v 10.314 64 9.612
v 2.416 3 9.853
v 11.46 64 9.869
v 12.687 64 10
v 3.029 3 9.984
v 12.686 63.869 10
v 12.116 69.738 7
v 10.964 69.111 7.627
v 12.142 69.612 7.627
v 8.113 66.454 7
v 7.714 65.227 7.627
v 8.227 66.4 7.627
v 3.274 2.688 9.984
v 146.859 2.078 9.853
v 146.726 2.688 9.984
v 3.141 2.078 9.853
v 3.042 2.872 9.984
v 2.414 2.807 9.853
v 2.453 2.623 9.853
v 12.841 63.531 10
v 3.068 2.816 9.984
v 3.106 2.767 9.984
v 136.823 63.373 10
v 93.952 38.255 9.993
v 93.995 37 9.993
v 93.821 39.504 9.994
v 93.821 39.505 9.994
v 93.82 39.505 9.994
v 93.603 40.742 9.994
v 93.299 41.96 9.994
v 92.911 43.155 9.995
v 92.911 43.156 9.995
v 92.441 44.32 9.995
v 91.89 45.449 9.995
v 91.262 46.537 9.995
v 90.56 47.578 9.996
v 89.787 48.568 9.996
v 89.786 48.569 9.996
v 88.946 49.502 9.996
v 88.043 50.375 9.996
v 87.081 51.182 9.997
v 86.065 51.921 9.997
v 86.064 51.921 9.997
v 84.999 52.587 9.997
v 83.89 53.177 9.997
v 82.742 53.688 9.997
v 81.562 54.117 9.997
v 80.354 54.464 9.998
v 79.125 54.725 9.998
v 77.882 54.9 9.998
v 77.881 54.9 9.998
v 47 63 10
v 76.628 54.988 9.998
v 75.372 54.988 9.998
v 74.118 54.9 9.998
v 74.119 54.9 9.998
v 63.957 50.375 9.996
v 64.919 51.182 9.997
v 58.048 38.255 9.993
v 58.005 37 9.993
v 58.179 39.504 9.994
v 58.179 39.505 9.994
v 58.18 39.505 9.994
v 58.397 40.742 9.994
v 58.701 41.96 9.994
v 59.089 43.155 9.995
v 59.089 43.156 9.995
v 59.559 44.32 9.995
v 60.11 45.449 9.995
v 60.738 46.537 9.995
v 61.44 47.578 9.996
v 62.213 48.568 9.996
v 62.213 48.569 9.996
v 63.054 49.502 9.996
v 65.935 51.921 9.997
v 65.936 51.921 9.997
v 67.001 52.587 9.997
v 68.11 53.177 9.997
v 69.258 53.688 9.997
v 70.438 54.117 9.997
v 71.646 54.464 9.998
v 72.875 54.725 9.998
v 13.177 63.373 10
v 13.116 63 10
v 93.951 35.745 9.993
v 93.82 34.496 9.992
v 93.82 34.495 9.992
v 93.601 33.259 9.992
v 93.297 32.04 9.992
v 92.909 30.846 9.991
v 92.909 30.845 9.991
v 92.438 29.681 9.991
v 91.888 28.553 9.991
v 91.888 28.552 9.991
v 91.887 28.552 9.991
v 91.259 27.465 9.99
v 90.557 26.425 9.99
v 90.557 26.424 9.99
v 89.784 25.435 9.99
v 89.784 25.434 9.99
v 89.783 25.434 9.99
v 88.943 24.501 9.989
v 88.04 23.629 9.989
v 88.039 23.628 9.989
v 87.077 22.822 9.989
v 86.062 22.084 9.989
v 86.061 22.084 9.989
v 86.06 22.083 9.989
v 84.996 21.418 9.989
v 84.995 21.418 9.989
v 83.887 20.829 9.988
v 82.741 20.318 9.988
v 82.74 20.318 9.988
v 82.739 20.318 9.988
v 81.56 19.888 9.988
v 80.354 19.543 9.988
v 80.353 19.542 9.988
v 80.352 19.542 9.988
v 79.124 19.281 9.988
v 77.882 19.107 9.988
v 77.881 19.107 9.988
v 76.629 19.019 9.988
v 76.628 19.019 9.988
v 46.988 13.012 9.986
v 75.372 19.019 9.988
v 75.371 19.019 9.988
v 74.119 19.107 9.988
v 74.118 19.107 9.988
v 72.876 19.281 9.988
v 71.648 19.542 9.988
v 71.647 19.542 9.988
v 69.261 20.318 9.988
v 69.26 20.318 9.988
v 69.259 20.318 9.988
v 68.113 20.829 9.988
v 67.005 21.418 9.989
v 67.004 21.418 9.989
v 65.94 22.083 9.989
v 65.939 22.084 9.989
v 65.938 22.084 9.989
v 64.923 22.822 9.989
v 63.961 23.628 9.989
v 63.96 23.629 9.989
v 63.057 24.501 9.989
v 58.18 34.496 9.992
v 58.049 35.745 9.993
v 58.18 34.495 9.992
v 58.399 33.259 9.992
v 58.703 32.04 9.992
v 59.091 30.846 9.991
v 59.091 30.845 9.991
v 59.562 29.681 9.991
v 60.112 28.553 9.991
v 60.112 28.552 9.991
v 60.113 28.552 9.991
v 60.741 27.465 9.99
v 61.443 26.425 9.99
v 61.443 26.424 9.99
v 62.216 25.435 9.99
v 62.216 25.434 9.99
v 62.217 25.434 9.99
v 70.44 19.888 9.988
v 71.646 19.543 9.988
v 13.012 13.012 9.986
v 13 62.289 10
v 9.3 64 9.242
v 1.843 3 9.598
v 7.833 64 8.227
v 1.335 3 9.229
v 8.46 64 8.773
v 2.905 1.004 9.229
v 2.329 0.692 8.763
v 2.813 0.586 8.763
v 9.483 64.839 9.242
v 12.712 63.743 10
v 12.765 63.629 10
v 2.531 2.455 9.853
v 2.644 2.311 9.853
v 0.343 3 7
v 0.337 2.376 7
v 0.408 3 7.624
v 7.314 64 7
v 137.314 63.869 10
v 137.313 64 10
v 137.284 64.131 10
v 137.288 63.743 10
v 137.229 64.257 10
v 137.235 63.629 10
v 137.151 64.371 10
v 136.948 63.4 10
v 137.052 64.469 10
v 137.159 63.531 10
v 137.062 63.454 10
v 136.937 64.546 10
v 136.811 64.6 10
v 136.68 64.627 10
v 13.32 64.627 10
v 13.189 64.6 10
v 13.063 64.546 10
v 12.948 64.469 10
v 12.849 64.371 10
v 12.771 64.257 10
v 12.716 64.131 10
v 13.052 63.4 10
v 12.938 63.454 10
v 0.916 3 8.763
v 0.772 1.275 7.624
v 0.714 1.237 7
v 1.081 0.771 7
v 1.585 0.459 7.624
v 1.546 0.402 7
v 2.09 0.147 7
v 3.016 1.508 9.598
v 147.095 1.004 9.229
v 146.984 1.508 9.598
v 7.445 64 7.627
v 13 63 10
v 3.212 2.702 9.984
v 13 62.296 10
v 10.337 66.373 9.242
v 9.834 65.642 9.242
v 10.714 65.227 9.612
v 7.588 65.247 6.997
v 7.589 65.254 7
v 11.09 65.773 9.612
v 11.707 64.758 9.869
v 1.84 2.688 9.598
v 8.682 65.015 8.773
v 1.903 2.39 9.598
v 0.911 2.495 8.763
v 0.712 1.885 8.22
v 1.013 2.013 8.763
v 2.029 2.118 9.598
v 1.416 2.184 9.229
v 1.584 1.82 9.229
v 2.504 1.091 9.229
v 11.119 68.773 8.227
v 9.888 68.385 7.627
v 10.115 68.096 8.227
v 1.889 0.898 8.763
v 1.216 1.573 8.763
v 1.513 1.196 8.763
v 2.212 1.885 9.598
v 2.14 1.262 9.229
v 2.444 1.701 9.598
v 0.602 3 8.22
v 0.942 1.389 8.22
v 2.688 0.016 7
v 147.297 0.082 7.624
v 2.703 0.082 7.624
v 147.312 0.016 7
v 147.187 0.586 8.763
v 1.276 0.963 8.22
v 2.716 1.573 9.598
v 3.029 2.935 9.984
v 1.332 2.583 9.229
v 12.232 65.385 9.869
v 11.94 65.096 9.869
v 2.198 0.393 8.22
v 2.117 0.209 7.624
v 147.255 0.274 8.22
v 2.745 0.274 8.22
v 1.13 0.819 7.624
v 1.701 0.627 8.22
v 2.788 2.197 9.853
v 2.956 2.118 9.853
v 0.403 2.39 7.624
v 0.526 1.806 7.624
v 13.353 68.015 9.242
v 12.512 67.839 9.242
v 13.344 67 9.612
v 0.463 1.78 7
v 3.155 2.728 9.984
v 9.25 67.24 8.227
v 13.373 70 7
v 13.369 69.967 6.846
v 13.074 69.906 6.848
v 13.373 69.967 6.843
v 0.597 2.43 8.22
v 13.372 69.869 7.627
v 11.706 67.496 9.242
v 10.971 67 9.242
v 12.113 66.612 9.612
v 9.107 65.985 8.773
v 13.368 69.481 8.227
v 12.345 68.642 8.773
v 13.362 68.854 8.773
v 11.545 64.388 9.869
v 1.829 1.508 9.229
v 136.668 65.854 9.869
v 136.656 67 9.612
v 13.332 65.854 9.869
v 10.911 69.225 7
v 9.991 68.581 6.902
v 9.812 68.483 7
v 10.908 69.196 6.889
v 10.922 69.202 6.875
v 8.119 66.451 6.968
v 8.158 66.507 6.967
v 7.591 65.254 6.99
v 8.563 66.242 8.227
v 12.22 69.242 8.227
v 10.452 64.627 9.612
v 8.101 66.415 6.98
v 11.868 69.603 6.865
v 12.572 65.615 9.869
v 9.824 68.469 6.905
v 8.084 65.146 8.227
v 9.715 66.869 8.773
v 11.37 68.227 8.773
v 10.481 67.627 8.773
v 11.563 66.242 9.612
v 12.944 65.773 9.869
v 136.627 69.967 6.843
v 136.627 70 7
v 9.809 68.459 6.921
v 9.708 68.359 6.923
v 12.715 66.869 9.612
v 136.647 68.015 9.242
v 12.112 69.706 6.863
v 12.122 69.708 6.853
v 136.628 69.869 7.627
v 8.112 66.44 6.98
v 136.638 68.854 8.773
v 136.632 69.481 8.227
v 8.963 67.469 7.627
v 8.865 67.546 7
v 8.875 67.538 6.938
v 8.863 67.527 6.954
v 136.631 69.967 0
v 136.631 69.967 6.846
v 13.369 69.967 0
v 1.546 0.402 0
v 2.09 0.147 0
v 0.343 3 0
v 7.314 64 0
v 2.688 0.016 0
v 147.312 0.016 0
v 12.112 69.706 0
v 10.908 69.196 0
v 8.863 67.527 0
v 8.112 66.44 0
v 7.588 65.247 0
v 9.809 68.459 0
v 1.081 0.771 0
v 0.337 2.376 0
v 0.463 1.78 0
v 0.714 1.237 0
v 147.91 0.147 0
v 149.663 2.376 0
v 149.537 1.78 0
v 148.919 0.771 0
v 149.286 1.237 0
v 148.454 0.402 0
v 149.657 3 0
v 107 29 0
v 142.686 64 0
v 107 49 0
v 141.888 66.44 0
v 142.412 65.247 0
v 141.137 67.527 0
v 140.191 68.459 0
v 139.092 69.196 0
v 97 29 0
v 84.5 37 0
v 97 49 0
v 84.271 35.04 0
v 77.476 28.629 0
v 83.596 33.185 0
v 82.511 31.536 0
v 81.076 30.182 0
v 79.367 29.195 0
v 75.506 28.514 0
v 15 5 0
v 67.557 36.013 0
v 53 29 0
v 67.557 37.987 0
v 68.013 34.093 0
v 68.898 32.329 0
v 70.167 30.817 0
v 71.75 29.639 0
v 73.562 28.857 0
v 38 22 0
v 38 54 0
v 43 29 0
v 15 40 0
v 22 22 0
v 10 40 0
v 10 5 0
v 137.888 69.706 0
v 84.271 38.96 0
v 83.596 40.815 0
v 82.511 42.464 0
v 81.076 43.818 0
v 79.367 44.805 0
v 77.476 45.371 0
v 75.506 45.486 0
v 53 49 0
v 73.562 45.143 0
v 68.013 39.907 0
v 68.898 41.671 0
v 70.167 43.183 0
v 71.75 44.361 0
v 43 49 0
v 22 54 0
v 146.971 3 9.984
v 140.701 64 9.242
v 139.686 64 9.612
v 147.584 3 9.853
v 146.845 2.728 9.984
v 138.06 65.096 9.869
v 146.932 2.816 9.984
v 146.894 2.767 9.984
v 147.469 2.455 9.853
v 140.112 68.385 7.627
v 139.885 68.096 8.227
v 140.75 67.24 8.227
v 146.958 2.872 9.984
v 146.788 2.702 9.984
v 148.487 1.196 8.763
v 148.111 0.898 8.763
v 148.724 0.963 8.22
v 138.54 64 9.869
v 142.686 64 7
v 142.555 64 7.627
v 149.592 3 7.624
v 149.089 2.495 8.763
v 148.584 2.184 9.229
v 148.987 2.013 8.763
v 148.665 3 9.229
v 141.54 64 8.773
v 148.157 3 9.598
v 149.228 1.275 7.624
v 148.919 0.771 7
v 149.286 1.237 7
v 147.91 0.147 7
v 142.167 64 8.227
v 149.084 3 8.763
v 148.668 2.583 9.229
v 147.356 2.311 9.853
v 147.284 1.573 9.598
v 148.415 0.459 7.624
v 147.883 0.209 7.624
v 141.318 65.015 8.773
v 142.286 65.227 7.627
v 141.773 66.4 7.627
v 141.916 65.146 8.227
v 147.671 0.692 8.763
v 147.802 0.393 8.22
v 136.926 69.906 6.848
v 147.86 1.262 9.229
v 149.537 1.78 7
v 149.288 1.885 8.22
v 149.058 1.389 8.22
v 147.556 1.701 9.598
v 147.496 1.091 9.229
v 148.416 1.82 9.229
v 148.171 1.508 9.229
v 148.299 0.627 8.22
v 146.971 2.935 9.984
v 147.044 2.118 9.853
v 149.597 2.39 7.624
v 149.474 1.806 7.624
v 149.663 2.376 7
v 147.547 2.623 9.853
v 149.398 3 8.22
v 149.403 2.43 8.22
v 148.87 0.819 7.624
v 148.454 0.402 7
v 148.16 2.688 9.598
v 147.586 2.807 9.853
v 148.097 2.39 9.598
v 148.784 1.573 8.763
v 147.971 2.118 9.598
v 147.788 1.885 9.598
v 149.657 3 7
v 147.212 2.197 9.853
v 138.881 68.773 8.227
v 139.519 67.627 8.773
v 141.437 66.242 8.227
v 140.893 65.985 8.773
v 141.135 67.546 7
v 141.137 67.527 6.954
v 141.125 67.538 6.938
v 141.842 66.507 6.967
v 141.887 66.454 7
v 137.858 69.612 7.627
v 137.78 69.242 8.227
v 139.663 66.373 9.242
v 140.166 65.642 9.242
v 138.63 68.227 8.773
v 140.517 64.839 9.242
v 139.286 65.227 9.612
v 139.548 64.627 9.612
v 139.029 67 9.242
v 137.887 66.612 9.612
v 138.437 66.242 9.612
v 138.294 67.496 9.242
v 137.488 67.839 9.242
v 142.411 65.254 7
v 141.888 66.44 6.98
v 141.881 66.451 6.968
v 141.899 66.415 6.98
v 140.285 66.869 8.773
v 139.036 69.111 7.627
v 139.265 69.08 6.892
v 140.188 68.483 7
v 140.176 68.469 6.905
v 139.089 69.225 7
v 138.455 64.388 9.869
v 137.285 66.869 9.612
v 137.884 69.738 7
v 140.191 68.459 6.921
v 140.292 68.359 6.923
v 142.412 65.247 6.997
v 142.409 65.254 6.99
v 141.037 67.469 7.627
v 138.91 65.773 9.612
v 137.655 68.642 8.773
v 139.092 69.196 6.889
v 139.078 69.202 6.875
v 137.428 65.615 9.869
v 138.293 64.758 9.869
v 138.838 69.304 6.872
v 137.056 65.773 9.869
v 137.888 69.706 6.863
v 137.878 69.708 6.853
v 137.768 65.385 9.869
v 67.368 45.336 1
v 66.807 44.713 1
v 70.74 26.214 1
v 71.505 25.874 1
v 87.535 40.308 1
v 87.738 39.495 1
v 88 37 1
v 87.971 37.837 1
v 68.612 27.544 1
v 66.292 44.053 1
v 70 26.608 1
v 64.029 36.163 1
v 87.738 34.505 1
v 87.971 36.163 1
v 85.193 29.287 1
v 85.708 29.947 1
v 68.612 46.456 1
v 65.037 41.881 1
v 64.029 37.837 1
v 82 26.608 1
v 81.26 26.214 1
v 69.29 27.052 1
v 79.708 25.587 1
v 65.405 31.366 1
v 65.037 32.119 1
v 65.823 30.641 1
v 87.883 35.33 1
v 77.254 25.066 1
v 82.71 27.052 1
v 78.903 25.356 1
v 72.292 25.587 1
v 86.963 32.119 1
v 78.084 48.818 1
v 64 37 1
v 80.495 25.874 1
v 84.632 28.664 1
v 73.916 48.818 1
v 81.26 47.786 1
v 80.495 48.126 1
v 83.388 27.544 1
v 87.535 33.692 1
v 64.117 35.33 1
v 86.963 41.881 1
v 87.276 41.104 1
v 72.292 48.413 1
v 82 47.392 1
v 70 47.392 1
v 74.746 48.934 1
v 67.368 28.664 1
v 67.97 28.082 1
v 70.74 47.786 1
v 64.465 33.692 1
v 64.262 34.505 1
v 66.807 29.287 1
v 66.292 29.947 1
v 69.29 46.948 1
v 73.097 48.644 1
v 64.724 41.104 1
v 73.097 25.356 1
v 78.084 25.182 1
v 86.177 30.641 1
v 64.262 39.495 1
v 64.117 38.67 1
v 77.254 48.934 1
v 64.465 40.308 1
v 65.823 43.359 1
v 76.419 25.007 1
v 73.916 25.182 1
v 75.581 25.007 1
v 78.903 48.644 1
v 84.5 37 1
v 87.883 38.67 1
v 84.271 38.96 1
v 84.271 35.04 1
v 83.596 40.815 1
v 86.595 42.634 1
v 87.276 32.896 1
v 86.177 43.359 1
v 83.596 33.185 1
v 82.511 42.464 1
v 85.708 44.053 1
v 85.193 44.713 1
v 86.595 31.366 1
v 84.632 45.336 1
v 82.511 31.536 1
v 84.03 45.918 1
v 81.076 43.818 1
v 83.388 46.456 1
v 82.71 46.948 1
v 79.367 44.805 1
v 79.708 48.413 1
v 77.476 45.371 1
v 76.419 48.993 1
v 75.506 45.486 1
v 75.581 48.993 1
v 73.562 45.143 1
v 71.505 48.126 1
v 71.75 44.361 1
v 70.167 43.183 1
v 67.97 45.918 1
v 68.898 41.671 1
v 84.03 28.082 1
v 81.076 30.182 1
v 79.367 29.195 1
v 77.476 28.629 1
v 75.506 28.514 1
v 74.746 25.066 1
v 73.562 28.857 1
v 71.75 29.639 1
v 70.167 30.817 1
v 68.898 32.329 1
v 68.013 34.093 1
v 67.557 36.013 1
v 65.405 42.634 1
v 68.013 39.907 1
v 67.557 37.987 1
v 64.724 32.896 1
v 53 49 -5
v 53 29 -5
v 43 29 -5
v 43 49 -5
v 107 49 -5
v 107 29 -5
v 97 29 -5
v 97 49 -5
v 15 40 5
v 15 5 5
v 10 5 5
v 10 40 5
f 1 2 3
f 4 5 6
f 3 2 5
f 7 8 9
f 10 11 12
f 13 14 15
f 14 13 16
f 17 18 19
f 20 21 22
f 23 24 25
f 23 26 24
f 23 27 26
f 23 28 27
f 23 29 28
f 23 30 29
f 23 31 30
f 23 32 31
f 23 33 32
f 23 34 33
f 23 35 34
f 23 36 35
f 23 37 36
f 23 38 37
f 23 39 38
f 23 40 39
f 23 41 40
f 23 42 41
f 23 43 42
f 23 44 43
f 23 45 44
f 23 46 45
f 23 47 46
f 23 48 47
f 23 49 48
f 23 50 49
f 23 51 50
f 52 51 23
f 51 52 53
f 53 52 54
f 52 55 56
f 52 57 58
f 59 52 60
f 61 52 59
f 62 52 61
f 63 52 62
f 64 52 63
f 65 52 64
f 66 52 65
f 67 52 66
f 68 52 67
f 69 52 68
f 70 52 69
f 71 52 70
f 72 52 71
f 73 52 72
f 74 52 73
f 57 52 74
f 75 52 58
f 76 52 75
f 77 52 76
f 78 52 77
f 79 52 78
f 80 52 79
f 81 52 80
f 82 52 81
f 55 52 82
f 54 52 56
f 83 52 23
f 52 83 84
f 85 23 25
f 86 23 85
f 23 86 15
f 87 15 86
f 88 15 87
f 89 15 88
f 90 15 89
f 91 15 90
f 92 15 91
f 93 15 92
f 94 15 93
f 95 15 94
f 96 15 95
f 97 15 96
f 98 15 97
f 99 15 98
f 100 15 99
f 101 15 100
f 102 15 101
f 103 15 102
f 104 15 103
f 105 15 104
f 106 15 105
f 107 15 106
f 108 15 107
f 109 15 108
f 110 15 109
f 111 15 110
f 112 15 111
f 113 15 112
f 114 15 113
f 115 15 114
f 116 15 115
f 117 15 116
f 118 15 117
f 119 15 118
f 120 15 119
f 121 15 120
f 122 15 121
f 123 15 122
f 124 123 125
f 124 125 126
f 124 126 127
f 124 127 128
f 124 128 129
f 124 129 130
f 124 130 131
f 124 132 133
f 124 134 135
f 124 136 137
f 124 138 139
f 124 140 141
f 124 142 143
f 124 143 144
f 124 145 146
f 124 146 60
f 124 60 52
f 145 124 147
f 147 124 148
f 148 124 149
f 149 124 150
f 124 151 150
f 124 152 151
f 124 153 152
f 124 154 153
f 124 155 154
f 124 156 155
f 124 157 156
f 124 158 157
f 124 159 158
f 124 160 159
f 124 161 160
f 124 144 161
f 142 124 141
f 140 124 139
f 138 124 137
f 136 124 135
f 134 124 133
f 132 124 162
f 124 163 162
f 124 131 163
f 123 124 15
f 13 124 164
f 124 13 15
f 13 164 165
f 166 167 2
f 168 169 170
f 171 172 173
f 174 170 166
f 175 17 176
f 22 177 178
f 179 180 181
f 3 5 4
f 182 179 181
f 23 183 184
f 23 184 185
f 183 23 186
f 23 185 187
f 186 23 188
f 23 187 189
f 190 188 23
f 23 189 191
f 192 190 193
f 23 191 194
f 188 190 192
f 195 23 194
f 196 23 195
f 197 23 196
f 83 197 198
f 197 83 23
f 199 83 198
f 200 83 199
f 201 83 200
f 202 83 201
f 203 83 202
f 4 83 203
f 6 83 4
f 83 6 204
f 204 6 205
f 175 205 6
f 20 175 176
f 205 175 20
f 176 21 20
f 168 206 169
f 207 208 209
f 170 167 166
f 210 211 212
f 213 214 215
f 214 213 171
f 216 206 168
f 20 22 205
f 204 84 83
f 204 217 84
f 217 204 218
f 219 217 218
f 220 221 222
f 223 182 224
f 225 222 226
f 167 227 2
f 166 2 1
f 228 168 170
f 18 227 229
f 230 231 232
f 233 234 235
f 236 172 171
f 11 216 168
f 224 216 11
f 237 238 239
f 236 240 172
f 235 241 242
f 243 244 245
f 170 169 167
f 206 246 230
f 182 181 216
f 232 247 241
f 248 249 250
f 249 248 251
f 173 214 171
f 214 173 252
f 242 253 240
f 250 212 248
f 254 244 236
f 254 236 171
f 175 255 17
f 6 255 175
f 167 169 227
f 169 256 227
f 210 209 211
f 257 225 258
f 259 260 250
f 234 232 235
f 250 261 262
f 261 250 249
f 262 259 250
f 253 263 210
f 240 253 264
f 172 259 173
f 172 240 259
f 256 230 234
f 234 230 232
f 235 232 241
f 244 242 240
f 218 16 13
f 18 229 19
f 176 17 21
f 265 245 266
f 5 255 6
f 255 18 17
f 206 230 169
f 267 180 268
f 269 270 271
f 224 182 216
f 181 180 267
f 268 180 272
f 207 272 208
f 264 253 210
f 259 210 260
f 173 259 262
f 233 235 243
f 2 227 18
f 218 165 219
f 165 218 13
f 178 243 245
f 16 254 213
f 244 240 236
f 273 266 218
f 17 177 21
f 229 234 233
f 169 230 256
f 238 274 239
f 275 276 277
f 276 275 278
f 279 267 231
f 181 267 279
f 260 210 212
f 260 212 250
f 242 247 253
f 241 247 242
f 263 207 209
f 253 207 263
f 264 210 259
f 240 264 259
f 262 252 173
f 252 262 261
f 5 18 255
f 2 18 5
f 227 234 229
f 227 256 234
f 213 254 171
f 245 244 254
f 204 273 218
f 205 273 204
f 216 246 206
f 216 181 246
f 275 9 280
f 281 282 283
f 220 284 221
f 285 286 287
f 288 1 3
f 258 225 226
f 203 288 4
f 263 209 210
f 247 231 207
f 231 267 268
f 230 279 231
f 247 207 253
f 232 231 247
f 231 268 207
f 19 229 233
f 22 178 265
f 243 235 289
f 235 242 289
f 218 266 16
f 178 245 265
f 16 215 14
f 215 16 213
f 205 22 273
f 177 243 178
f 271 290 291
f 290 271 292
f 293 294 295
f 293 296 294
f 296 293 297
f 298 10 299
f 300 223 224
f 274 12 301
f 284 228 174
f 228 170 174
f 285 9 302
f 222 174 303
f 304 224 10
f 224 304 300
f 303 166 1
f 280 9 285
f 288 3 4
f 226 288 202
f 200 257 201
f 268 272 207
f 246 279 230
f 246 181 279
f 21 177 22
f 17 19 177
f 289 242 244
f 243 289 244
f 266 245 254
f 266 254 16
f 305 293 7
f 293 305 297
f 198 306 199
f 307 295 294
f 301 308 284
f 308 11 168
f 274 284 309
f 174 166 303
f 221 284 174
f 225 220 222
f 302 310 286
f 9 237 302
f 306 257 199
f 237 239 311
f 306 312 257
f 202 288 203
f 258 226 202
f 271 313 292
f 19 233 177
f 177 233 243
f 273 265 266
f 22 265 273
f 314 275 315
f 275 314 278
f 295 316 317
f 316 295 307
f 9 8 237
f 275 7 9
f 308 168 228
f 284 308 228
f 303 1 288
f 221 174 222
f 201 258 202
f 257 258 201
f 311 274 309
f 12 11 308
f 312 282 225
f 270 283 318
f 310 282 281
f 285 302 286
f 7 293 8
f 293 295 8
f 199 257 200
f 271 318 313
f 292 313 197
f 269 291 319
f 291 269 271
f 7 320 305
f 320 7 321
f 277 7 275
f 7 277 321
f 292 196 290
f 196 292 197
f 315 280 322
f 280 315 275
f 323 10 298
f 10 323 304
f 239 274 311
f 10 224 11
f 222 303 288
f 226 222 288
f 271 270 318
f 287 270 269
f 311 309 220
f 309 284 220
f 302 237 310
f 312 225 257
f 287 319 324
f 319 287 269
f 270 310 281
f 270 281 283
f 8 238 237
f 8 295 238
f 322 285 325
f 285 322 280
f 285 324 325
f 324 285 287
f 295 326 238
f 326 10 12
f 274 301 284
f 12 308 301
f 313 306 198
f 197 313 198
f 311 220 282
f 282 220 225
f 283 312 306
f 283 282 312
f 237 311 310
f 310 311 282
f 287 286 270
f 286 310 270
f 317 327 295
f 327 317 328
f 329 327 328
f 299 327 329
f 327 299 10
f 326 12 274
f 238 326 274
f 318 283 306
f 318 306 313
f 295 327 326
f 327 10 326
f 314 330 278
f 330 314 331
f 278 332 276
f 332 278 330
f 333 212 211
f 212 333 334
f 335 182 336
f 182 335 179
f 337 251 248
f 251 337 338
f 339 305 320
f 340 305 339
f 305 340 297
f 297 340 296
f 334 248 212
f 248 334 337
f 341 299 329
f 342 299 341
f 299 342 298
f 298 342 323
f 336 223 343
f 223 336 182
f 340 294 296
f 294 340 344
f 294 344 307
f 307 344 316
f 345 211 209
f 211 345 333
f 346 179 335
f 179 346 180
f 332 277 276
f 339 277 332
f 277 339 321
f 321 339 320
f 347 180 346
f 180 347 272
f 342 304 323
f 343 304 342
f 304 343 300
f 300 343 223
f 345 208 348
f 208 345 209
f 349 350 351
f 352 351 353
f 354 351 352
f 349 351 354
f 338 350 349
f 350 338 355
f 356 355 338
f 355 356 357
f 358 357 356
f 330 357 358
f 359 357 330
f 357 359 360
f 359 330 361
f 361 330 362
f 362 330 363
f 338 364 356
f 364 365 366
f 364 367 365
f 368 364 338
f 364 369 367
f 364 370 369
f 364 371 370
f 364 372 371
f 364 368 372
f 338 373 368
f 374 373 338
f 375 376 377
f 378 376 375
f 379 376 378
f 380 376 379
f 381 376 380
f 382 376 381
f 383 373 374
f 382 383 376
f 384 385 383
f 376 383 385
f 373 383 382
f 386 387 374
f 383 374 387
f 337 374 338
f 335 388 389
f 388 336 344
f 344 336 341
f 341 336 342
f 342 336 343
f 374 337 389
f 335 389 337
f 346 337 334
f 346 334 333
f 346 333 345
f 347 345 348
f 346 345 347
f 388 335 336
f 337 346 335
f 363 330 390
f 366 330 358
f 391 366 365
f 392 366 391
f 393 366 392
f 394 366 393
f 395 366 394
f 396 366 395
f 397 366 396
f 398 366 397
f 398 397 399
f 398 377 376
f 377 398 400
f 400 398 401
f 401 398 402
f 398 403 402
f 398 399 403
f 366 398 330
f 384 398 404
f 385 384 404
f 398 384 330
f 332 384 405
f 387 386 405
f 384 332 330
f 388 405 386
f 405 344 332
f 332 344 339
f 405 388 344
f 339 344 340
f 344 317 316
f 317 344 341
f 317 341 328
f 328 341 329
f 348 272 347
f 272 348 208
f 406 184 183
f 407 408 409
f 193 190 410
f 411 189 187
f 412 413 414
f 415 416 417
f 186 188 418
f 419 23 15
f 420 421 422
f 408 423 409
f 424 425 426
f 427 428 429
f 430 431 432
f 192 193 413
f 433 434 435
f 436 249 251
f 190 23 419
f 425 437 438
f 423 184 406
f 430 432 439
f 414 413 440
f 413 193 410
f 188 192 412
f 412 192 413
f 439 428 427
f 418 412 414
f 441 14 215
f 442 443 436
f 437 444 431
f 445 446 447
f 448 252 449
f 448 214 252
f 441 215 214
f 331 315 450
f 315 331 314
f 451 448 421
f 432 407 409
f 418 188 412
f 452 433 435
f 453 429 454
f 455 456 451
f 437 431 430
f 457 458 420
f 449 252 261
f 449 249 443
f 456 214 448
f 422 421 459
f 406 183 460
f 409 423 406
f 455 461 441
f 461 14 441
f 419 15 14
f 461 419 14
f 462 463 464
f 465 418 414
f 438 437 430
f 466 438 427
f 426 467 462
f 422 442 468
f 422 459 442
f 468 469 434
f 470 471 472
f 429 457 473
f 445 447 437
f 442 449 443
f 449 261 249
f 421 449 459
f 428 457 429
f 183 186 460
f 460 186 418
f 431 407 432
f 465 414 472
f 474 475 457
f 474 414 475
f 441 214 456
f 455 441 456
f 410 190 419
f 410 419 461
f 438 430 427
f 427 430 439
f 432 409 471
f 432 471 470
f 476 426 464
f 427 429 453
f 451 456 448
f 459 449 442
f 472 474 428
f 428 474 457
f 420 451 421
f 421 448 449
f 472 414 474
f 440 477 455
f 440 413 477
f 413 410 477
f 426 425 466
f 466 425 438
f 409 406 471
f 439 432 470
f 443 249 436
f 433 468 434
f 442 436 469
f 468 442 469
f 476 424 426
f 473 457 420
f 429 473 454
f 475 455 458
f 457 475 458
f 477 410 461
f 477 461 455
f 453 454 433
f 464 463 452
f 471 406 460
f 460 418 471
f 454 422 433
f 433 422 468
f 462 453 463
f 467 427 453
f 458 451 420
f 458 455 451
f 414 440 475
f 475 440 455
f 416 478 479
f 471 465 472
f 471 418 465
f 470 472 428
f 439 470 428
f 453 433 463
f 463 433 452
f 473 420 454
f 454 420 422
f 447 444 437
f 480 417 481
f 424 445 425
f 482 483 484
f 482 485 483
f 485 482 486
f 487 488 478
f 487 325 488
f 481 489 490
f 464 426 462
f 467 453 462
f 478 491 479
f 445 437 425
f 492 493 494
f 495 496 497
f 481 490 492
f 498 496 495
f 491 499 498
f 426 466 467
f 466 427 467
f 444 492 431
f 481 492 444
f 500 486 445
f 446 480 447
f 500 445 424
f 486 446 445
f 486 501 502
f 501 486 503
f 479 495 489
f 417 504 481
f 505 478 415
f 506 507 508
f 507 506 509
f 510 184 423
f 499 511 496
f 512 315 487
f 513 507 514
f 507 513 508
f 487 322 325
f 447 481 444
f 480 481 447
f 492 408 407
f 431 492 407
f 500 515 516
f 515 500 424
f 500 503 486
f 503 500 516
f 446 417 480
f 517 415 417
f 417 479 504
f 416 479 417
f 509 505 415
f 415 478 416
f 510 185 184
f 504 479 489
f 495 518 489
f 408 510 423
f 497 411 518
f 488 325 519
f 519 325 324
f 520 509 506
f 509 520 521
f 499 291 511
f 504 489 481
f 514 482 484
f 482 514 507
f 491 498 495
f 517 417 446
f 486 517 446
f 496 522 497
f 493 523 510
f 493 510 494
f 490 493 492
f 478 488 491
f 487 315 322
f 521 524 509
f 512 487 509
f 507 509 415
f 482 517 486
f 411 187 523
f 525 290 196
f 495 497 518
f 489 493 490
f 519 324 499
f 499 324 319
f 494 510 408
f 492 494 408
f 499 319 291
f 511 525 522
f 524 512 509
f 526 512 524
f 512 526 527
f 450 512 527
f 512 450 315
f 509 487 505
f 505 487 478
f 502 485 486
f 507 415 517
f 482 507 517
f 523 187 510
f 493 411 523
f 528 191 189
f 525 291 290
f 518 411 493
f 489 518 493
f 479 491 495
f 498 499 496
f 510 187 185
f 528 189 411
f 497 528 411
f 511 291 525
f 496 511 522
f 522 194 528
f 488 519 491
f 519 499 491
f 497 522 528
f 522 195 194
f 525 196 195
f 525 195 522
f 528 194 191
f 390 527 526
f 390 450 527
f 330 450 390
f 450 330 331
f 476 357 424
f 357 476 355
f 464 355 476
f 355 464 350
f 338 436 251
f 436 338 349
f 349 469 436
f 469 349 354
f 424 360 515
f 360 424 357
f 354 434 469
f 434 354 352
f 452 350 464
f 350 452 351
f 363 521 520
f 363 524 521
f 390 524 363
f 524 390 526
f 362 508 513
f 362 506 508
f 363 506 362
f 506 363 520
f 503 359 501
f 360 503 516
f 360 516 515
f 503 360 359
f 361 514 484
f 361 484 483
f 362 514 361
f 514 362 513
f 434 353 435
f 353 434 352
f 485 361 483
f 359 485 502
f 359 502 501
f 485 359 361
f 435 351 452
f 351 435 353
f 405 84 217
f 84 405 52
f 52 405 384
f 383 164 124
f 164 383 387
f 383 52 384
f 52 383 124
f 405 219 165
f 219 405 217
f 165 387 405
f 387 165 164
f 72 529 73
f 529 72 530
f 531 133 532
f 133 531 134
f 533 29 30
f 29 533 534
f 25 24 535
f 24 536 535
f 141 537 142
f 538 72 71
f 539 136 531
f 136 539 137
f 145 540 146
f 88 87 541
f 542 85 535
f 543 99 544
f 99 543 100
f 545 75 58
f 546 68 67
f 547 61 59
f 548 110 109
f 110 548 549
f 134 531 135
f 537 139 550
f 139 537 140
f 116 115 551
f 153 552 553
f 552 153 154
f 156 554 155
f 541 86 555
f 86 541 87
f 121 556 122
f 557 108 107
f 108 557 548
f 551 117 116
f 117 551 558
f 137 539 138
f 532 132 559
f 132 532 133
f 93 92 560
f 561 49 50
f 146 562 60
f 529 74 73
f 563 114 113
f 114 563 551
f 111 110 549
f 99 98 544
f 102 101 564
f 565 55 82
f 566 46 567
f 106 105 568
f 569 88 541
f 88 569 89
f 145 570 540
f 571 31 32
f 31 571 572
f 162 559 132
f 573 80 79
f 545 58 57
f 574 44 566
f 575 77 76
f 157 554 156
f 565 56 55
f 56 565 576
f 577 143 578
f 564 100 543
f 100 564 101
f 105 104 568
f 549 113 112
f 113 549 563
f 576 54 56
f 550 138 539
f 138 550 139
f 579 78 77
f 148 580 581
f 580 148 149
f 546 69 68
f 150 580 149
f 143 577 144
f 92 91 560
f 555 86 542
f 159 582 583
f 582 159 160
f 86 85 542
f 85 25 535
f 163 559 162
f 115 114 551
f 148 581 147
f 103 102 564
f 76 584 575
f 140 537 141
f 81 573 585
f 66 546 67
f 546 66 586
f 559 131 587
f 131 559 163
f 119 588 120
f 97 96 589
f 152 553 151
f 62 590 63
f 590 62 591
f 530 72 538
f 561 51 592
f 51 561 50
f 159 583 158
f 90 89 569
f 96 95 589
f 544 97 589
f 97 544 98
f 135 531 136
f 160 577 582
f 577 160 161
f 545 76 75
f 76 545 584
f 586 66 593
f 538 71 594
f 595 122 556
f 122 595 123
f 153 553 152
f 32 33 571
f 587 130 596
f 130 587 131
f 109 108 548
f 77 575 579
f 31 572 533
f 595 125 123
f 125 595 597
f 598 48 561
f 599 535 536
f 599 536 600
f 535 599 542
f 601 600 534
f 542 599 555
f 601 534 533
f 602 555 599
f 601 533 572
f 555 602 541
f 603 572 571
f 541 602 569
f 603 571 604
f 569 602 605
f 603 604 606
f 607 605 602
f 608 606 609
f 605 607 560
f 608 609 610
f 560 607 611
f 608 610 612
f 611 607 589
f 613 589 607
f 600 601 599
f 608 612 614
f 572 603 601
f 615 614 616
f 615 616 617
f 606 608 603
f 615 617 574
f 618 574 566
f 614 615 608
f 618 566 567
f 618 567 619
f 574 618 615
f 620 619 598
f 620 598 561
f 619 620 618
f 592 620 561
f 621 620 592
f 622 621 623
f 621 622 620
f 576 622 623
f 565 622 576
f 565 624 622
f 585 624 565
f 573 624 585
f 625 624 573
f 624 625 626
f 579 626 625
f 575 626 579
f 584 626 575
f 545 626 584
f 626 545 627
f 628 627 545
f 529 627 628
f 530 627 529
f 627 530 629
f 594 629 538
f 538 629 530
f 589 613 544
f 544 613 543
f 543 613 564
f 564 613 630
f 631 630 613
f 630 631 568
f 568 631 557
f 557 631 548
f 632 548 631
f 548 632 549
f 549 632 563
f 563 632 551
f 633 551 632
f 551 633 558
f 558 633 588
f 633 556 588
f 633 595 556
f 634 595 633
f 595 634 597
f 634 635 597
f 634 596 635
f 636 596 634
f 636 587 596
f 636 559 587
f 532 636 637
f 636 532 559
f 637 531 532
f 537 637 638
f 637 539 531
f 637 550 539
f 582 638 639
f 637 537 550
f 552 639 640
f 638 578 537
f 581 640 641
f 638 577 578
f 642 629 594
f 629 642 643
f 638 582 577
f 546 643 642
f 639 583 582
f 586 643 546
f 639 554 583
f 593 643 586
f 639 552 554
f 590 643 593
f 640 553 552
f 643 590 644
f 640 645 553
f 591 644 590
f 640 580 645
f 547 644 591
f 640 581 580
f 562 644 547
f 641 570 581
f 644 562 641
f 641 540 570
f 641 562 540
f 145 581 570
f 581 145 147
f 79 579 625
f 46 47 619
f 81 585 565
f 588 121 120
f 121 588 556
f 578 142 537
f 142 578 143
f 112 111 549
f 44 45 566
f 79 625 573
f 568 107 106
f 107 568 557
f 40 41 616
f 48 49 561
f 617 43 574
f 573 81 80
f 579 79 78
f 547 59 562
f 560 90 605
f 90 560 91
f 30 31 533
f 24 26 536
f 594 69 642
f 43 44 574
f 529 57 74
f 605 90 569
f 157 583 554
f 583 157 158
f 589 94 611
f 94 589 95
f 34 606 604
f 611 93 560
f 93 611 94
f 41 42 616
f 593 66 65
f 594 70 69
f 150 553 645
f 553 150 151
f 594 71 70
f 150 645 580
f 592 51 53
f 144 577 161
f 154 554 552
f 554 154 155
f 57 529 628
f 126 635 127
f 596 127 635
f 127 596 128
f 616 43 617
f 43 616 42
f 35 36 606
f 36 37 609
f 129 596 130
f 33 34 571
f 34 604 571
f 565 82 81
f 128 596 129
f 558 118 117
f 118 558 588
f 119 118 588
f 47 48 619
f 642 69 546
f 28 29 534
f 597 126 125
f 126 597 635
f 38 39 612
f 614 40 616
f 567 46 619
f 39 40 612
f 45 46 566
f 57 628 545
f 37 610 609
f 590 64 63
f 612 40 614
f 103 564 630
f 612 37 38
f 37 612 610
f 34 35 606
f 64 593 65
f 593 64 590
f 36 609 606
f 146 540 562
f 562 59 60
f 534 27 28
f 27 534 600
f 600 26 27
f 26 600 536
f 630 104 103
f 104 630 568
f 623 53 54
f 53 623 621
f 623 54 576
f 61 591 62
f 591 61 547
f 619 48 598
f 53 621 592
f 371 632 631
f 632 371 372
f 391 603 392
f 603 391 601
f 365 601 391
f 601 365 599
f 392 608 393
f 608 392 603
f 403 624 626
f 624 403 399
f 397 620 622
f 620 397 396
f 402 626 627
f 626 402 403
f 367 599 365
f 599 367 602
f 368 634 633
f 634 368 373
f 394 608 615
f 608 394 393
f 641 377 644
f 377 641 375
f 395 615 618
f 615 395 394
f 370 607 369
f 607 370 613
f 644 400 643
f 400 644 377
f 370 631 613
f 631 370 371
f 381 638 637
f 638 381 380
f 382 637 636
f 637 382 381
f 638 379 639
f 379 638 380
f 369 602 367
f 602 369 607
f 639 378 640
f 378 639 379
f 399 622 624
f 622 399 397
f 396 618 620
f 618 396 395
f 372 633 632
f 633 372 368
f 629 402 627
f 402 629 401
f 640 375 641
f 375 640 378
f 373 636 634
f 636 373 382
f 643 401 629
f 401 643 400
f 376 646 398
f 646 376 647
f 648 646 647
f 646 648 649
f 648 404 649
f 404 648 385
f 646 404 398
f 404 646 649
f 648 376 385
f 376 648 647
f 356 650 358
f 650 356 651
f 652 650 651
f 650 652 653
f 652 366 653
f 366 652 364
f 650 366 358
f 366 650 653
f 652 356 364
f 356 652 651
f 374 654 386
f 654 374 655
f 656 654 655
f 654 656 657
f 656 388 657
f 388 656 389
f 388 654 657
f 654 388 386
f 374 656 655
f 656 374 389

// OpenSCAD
/*
in our hacker space at work we got some used lockers from a defunct bowling ally.. some were missing the  


 https://en.wikibooks.org/wiki/OpenSCAD_User_Manual/The_OpenSCAD_Language#scale_2
 This is a breakdown of what you can do with the independent elements in the matrix (for the first three rows):
 [Scale X],[Scale X sheared along Y],[Scale X sheared along Z], [Translate X]
 [Scale Y sheared along X],[Scale Y],[Scale Y sheared along Z], [Translate Y]
 [Scale Z sheared along X],[Scale Z sheared along Y],[Scale Z], [Translate Z]
 the fourth row is used in 3D environments to define a view of the object. it is not used in OpenSCAD and should be [0,0,0,1]
               */

    


module roundedCornersOnlyBase(xdim ,ydim ,zdim,rdim){
    rdim2=rdim*2;
    hull(){
        
        translate([rdim,rdim,0])cylinder (h=zdim,r=rdim,$fn=30 );
        translate([xdim-rdim,rdim,0])cylinder (h=zdim,r=rdim,$fn=30);
        translate([rdim2,ydim-rdim2,0])cylinder (h=zdim,r=rdim2,$fn=30);
        translate([xdim-rdim2,ydim-rdim2,0])cylinder (h=zdim,r=rdim2,$fn=30 );
    }
}

module roundedBase(xdim ,ydim ,zdim,rdim){
    rdim2=rdim*4;
    hull(){
        translate([rdim,rdim,0])sphere(r=rdim,$fn=30);
            
        translate([xdim-rdim,rdim,0])
        //resize(newsize=[rdim*3,rdim*3,rdim]) 
        sphere(r=rdim,$fn=30);; 
            
        
        translate([rdim2/2,ydim-rdim2/2,0])
            resize(newsize=[rdim2,rdim2,rdim*2])  sphere(r=1,$fn=30);
        //sphere(r=rdim,$fn=30);
        translate([xdim-rdim2/2,ydim-rdim2/2,0]) // how does it effect this
             resize(newsize=[rdim2,rdim2,rdim*2])  sphere(r=1,$fn=30);
        //sphere(r=rdim,$fn=30);
    }
}


module roundedTopOnlyBase(xdim ,ydim ,zdim,rdim)
{
    union()
    {
    translate([0,0,zdim-rdim]) roundedBase(xdim,ydim,zdim,rdim);
     roundedCornersOnlyBase(xdim,ydim,zdim-rdim,rdim);
    }
 }

module BaseAngledIn(xdim ,ydim ,zdim,rdim,AngleIn)
 {
     Mpos = [ [ 1, AngleIn,0, 0 ],
       [ 0, 1, 0, 0 ],   // [ 0, 1, 0.7, 0 ], // The "0.7" is the skew value; pushed along the y axis
       [ 0, 0, 1, 0 ],
       [ 0, 0, 0, 1 ] ] ;
 Mneg = [ [ 1, -1*AngleIn,0, 0 ],
       [ 0, 1, 0, 0 ],   // [ 0, 1, 0.7, 0 ], // The "0.7" is the skew value; pushed along the y axis
       [ 0, 0, 1, 0 ],
       [ 0, 0, 0, 1 ] ] ;
     
     intersection(){
             multmatrix(Mpos) { 
                roundedTopOnlyBase(xdim,ydim,zdim,rdim);
             }
                  multmatrix(Mneg) { 
                roundedTopOnlyBase(xdim,ydim,zdim,rdim);
             }
         }
}
    
     
module NumberViewinngHole(TotalHight=10,OffSetX=115,OffSetY=22,HoleX1=16,HoleY1=32,shear=2)
{
    /*
    [Scale X],[Scale X sheared along Y],[Scale X sheared along Z], [Translate X]
 [Scale Y sheared along X],[Scale Y],[Scale Y sheared along Z], [Translate Y]
 [Scale Z sheared along X],[Scale Z sheared along Y],[Scale Z], [Translate Z]

    */
    MPosPos = [ [ 1, 0,shear, 0 ],
       [ 0, 1, shear, 0 ], 
       [ 0, 0, 1, 0 ],
       [ 0, 0, 0, 1 ] ] ;
    MPosNeg = [ [ 1, 0,shear, 0 ],
       [ 0, 1,-1* shear, 0 ], 
       [ 0, 0, 1, 0 ],
       [ 0, 0, 0, 1 ] ] ;
    MNegPos = [ [ 1, 0,-1*shear, 0 ],
       [ 0, 1, shear, 0 ], 
       [ 0, 0, 1, 0 ],
       [ 0, 0, 0, 1 ] ] ;
    MNegNeg = [ [ 1, 0,-1*shear, 0 ],
       [ 0, 1, -1*shear, 0 ], 
       [ 0, 0, 1, 0 ],
       [ 0, 0, 0, 1 ] ] ;
     
    translate([OffSetX,OffSetY,0])
    {
        union(){
           translate([0,0,-1]){
                   cube([HoleX1,HoleY1,TotalHight+2], center=false);
              };
        hull(){
               
                multmatrix(MPosPos)  cube([HoleX1,HoleY1,TotalHight], center=false);
                multmatrix(MPosNeg)  cube([HoleX1,HoleY1,TotalHight], center=false);
                multmatrix(MNegPos)  cube([HoleX1,HoleY1,TotalHight], center=false);
                multmatrix(MNegNeg)  cube([HoleX1,HoleY1,TotalHight], center=false);
               
                };
            }
    }
}//end module


module KeyHole(TotalHight=10,OffSetX=76,OffSetY=37,HoleR1=12,HoleR2=18,HoleR3=8.5)
{
    translate([OffSetX,OffSetY,0]){
    union(){
    translate([0,0,1]){
    cylinder(h=TotalHight-1,r1=HoleR1,r2=HoleR2, center=false,$fn=90);}
    translate([0,0,-1]) cylinder(h=TotalHight,r=HoleR3 ,center=false);
        }
    }
}//end module

module screwMount(Hight=5,OffSetX=43,OffSetY=29,Holex1=10,HoleY1=20)
{
    translate([OffSetX,OffSetY,-1*Hight]){
   // union(){
        cube([Holex1,HoleY1,Hight], center=false);
     //   }
    }
}//end module

module GAtext(Hight=10,OffSetX=43,OffSetY=10)
{
   translate([OffSetX,OffSetY,Hight+.3]){   
        rotate(a=90,v=[0,0,1]){
            text("Great American",size=5);
            }
    }
}//end module

module DeadSpacce()
{
 translate([10,5,0]){
        cube([5,35,5] ,center =false);
     }
    }


TotalHight=10;
TotalWidth=70;
TotalLenght=150;
sheareiNfOR= 8/TotalWidth; // MM IN FROM STRAT EDGE
thickness=5;
//roundedCornersOnlyBase(TotalLenght,TotalWidth,TotalHight,3);
//roundedBase(TotalLenght,TotalWidth,TotalHight,3);
//roundedTopOnlyBase(TotalLenght,TotalWidth,TotalHight,3);


//!KeyHole();
//!NumberViewinngHole();
//!screwMount();

//intersection(){
  //  cube([TotalLenght+1,TotalWidth+1,3],center=false);
//!resize(newsize=[10,10,5]) sphere(r=1,$fn=30); 
difference(){
    union(){
        
            difference(){

            BaseAngledIn(TotalLenght,TotalWidth,TotalHight,3,sheareiNfOR);
                 
                NumberViewinngHole(TotalHight,22,22,16,32,.9);
                KeyHole();

            }
    screwMount(Hight=5,OffSetX=43,OffSetY=29,Holex1=10,HoleY1=20);
    screwMount(Hight=5,OffSetX=97,OffSetY=29,Holex1=10,HoleY1=20);
      //GAtext();   text is for display only will not print in stl file :(
           // c:\HackItBubble.png
    //};

    };
    DeadSpacce();
}
